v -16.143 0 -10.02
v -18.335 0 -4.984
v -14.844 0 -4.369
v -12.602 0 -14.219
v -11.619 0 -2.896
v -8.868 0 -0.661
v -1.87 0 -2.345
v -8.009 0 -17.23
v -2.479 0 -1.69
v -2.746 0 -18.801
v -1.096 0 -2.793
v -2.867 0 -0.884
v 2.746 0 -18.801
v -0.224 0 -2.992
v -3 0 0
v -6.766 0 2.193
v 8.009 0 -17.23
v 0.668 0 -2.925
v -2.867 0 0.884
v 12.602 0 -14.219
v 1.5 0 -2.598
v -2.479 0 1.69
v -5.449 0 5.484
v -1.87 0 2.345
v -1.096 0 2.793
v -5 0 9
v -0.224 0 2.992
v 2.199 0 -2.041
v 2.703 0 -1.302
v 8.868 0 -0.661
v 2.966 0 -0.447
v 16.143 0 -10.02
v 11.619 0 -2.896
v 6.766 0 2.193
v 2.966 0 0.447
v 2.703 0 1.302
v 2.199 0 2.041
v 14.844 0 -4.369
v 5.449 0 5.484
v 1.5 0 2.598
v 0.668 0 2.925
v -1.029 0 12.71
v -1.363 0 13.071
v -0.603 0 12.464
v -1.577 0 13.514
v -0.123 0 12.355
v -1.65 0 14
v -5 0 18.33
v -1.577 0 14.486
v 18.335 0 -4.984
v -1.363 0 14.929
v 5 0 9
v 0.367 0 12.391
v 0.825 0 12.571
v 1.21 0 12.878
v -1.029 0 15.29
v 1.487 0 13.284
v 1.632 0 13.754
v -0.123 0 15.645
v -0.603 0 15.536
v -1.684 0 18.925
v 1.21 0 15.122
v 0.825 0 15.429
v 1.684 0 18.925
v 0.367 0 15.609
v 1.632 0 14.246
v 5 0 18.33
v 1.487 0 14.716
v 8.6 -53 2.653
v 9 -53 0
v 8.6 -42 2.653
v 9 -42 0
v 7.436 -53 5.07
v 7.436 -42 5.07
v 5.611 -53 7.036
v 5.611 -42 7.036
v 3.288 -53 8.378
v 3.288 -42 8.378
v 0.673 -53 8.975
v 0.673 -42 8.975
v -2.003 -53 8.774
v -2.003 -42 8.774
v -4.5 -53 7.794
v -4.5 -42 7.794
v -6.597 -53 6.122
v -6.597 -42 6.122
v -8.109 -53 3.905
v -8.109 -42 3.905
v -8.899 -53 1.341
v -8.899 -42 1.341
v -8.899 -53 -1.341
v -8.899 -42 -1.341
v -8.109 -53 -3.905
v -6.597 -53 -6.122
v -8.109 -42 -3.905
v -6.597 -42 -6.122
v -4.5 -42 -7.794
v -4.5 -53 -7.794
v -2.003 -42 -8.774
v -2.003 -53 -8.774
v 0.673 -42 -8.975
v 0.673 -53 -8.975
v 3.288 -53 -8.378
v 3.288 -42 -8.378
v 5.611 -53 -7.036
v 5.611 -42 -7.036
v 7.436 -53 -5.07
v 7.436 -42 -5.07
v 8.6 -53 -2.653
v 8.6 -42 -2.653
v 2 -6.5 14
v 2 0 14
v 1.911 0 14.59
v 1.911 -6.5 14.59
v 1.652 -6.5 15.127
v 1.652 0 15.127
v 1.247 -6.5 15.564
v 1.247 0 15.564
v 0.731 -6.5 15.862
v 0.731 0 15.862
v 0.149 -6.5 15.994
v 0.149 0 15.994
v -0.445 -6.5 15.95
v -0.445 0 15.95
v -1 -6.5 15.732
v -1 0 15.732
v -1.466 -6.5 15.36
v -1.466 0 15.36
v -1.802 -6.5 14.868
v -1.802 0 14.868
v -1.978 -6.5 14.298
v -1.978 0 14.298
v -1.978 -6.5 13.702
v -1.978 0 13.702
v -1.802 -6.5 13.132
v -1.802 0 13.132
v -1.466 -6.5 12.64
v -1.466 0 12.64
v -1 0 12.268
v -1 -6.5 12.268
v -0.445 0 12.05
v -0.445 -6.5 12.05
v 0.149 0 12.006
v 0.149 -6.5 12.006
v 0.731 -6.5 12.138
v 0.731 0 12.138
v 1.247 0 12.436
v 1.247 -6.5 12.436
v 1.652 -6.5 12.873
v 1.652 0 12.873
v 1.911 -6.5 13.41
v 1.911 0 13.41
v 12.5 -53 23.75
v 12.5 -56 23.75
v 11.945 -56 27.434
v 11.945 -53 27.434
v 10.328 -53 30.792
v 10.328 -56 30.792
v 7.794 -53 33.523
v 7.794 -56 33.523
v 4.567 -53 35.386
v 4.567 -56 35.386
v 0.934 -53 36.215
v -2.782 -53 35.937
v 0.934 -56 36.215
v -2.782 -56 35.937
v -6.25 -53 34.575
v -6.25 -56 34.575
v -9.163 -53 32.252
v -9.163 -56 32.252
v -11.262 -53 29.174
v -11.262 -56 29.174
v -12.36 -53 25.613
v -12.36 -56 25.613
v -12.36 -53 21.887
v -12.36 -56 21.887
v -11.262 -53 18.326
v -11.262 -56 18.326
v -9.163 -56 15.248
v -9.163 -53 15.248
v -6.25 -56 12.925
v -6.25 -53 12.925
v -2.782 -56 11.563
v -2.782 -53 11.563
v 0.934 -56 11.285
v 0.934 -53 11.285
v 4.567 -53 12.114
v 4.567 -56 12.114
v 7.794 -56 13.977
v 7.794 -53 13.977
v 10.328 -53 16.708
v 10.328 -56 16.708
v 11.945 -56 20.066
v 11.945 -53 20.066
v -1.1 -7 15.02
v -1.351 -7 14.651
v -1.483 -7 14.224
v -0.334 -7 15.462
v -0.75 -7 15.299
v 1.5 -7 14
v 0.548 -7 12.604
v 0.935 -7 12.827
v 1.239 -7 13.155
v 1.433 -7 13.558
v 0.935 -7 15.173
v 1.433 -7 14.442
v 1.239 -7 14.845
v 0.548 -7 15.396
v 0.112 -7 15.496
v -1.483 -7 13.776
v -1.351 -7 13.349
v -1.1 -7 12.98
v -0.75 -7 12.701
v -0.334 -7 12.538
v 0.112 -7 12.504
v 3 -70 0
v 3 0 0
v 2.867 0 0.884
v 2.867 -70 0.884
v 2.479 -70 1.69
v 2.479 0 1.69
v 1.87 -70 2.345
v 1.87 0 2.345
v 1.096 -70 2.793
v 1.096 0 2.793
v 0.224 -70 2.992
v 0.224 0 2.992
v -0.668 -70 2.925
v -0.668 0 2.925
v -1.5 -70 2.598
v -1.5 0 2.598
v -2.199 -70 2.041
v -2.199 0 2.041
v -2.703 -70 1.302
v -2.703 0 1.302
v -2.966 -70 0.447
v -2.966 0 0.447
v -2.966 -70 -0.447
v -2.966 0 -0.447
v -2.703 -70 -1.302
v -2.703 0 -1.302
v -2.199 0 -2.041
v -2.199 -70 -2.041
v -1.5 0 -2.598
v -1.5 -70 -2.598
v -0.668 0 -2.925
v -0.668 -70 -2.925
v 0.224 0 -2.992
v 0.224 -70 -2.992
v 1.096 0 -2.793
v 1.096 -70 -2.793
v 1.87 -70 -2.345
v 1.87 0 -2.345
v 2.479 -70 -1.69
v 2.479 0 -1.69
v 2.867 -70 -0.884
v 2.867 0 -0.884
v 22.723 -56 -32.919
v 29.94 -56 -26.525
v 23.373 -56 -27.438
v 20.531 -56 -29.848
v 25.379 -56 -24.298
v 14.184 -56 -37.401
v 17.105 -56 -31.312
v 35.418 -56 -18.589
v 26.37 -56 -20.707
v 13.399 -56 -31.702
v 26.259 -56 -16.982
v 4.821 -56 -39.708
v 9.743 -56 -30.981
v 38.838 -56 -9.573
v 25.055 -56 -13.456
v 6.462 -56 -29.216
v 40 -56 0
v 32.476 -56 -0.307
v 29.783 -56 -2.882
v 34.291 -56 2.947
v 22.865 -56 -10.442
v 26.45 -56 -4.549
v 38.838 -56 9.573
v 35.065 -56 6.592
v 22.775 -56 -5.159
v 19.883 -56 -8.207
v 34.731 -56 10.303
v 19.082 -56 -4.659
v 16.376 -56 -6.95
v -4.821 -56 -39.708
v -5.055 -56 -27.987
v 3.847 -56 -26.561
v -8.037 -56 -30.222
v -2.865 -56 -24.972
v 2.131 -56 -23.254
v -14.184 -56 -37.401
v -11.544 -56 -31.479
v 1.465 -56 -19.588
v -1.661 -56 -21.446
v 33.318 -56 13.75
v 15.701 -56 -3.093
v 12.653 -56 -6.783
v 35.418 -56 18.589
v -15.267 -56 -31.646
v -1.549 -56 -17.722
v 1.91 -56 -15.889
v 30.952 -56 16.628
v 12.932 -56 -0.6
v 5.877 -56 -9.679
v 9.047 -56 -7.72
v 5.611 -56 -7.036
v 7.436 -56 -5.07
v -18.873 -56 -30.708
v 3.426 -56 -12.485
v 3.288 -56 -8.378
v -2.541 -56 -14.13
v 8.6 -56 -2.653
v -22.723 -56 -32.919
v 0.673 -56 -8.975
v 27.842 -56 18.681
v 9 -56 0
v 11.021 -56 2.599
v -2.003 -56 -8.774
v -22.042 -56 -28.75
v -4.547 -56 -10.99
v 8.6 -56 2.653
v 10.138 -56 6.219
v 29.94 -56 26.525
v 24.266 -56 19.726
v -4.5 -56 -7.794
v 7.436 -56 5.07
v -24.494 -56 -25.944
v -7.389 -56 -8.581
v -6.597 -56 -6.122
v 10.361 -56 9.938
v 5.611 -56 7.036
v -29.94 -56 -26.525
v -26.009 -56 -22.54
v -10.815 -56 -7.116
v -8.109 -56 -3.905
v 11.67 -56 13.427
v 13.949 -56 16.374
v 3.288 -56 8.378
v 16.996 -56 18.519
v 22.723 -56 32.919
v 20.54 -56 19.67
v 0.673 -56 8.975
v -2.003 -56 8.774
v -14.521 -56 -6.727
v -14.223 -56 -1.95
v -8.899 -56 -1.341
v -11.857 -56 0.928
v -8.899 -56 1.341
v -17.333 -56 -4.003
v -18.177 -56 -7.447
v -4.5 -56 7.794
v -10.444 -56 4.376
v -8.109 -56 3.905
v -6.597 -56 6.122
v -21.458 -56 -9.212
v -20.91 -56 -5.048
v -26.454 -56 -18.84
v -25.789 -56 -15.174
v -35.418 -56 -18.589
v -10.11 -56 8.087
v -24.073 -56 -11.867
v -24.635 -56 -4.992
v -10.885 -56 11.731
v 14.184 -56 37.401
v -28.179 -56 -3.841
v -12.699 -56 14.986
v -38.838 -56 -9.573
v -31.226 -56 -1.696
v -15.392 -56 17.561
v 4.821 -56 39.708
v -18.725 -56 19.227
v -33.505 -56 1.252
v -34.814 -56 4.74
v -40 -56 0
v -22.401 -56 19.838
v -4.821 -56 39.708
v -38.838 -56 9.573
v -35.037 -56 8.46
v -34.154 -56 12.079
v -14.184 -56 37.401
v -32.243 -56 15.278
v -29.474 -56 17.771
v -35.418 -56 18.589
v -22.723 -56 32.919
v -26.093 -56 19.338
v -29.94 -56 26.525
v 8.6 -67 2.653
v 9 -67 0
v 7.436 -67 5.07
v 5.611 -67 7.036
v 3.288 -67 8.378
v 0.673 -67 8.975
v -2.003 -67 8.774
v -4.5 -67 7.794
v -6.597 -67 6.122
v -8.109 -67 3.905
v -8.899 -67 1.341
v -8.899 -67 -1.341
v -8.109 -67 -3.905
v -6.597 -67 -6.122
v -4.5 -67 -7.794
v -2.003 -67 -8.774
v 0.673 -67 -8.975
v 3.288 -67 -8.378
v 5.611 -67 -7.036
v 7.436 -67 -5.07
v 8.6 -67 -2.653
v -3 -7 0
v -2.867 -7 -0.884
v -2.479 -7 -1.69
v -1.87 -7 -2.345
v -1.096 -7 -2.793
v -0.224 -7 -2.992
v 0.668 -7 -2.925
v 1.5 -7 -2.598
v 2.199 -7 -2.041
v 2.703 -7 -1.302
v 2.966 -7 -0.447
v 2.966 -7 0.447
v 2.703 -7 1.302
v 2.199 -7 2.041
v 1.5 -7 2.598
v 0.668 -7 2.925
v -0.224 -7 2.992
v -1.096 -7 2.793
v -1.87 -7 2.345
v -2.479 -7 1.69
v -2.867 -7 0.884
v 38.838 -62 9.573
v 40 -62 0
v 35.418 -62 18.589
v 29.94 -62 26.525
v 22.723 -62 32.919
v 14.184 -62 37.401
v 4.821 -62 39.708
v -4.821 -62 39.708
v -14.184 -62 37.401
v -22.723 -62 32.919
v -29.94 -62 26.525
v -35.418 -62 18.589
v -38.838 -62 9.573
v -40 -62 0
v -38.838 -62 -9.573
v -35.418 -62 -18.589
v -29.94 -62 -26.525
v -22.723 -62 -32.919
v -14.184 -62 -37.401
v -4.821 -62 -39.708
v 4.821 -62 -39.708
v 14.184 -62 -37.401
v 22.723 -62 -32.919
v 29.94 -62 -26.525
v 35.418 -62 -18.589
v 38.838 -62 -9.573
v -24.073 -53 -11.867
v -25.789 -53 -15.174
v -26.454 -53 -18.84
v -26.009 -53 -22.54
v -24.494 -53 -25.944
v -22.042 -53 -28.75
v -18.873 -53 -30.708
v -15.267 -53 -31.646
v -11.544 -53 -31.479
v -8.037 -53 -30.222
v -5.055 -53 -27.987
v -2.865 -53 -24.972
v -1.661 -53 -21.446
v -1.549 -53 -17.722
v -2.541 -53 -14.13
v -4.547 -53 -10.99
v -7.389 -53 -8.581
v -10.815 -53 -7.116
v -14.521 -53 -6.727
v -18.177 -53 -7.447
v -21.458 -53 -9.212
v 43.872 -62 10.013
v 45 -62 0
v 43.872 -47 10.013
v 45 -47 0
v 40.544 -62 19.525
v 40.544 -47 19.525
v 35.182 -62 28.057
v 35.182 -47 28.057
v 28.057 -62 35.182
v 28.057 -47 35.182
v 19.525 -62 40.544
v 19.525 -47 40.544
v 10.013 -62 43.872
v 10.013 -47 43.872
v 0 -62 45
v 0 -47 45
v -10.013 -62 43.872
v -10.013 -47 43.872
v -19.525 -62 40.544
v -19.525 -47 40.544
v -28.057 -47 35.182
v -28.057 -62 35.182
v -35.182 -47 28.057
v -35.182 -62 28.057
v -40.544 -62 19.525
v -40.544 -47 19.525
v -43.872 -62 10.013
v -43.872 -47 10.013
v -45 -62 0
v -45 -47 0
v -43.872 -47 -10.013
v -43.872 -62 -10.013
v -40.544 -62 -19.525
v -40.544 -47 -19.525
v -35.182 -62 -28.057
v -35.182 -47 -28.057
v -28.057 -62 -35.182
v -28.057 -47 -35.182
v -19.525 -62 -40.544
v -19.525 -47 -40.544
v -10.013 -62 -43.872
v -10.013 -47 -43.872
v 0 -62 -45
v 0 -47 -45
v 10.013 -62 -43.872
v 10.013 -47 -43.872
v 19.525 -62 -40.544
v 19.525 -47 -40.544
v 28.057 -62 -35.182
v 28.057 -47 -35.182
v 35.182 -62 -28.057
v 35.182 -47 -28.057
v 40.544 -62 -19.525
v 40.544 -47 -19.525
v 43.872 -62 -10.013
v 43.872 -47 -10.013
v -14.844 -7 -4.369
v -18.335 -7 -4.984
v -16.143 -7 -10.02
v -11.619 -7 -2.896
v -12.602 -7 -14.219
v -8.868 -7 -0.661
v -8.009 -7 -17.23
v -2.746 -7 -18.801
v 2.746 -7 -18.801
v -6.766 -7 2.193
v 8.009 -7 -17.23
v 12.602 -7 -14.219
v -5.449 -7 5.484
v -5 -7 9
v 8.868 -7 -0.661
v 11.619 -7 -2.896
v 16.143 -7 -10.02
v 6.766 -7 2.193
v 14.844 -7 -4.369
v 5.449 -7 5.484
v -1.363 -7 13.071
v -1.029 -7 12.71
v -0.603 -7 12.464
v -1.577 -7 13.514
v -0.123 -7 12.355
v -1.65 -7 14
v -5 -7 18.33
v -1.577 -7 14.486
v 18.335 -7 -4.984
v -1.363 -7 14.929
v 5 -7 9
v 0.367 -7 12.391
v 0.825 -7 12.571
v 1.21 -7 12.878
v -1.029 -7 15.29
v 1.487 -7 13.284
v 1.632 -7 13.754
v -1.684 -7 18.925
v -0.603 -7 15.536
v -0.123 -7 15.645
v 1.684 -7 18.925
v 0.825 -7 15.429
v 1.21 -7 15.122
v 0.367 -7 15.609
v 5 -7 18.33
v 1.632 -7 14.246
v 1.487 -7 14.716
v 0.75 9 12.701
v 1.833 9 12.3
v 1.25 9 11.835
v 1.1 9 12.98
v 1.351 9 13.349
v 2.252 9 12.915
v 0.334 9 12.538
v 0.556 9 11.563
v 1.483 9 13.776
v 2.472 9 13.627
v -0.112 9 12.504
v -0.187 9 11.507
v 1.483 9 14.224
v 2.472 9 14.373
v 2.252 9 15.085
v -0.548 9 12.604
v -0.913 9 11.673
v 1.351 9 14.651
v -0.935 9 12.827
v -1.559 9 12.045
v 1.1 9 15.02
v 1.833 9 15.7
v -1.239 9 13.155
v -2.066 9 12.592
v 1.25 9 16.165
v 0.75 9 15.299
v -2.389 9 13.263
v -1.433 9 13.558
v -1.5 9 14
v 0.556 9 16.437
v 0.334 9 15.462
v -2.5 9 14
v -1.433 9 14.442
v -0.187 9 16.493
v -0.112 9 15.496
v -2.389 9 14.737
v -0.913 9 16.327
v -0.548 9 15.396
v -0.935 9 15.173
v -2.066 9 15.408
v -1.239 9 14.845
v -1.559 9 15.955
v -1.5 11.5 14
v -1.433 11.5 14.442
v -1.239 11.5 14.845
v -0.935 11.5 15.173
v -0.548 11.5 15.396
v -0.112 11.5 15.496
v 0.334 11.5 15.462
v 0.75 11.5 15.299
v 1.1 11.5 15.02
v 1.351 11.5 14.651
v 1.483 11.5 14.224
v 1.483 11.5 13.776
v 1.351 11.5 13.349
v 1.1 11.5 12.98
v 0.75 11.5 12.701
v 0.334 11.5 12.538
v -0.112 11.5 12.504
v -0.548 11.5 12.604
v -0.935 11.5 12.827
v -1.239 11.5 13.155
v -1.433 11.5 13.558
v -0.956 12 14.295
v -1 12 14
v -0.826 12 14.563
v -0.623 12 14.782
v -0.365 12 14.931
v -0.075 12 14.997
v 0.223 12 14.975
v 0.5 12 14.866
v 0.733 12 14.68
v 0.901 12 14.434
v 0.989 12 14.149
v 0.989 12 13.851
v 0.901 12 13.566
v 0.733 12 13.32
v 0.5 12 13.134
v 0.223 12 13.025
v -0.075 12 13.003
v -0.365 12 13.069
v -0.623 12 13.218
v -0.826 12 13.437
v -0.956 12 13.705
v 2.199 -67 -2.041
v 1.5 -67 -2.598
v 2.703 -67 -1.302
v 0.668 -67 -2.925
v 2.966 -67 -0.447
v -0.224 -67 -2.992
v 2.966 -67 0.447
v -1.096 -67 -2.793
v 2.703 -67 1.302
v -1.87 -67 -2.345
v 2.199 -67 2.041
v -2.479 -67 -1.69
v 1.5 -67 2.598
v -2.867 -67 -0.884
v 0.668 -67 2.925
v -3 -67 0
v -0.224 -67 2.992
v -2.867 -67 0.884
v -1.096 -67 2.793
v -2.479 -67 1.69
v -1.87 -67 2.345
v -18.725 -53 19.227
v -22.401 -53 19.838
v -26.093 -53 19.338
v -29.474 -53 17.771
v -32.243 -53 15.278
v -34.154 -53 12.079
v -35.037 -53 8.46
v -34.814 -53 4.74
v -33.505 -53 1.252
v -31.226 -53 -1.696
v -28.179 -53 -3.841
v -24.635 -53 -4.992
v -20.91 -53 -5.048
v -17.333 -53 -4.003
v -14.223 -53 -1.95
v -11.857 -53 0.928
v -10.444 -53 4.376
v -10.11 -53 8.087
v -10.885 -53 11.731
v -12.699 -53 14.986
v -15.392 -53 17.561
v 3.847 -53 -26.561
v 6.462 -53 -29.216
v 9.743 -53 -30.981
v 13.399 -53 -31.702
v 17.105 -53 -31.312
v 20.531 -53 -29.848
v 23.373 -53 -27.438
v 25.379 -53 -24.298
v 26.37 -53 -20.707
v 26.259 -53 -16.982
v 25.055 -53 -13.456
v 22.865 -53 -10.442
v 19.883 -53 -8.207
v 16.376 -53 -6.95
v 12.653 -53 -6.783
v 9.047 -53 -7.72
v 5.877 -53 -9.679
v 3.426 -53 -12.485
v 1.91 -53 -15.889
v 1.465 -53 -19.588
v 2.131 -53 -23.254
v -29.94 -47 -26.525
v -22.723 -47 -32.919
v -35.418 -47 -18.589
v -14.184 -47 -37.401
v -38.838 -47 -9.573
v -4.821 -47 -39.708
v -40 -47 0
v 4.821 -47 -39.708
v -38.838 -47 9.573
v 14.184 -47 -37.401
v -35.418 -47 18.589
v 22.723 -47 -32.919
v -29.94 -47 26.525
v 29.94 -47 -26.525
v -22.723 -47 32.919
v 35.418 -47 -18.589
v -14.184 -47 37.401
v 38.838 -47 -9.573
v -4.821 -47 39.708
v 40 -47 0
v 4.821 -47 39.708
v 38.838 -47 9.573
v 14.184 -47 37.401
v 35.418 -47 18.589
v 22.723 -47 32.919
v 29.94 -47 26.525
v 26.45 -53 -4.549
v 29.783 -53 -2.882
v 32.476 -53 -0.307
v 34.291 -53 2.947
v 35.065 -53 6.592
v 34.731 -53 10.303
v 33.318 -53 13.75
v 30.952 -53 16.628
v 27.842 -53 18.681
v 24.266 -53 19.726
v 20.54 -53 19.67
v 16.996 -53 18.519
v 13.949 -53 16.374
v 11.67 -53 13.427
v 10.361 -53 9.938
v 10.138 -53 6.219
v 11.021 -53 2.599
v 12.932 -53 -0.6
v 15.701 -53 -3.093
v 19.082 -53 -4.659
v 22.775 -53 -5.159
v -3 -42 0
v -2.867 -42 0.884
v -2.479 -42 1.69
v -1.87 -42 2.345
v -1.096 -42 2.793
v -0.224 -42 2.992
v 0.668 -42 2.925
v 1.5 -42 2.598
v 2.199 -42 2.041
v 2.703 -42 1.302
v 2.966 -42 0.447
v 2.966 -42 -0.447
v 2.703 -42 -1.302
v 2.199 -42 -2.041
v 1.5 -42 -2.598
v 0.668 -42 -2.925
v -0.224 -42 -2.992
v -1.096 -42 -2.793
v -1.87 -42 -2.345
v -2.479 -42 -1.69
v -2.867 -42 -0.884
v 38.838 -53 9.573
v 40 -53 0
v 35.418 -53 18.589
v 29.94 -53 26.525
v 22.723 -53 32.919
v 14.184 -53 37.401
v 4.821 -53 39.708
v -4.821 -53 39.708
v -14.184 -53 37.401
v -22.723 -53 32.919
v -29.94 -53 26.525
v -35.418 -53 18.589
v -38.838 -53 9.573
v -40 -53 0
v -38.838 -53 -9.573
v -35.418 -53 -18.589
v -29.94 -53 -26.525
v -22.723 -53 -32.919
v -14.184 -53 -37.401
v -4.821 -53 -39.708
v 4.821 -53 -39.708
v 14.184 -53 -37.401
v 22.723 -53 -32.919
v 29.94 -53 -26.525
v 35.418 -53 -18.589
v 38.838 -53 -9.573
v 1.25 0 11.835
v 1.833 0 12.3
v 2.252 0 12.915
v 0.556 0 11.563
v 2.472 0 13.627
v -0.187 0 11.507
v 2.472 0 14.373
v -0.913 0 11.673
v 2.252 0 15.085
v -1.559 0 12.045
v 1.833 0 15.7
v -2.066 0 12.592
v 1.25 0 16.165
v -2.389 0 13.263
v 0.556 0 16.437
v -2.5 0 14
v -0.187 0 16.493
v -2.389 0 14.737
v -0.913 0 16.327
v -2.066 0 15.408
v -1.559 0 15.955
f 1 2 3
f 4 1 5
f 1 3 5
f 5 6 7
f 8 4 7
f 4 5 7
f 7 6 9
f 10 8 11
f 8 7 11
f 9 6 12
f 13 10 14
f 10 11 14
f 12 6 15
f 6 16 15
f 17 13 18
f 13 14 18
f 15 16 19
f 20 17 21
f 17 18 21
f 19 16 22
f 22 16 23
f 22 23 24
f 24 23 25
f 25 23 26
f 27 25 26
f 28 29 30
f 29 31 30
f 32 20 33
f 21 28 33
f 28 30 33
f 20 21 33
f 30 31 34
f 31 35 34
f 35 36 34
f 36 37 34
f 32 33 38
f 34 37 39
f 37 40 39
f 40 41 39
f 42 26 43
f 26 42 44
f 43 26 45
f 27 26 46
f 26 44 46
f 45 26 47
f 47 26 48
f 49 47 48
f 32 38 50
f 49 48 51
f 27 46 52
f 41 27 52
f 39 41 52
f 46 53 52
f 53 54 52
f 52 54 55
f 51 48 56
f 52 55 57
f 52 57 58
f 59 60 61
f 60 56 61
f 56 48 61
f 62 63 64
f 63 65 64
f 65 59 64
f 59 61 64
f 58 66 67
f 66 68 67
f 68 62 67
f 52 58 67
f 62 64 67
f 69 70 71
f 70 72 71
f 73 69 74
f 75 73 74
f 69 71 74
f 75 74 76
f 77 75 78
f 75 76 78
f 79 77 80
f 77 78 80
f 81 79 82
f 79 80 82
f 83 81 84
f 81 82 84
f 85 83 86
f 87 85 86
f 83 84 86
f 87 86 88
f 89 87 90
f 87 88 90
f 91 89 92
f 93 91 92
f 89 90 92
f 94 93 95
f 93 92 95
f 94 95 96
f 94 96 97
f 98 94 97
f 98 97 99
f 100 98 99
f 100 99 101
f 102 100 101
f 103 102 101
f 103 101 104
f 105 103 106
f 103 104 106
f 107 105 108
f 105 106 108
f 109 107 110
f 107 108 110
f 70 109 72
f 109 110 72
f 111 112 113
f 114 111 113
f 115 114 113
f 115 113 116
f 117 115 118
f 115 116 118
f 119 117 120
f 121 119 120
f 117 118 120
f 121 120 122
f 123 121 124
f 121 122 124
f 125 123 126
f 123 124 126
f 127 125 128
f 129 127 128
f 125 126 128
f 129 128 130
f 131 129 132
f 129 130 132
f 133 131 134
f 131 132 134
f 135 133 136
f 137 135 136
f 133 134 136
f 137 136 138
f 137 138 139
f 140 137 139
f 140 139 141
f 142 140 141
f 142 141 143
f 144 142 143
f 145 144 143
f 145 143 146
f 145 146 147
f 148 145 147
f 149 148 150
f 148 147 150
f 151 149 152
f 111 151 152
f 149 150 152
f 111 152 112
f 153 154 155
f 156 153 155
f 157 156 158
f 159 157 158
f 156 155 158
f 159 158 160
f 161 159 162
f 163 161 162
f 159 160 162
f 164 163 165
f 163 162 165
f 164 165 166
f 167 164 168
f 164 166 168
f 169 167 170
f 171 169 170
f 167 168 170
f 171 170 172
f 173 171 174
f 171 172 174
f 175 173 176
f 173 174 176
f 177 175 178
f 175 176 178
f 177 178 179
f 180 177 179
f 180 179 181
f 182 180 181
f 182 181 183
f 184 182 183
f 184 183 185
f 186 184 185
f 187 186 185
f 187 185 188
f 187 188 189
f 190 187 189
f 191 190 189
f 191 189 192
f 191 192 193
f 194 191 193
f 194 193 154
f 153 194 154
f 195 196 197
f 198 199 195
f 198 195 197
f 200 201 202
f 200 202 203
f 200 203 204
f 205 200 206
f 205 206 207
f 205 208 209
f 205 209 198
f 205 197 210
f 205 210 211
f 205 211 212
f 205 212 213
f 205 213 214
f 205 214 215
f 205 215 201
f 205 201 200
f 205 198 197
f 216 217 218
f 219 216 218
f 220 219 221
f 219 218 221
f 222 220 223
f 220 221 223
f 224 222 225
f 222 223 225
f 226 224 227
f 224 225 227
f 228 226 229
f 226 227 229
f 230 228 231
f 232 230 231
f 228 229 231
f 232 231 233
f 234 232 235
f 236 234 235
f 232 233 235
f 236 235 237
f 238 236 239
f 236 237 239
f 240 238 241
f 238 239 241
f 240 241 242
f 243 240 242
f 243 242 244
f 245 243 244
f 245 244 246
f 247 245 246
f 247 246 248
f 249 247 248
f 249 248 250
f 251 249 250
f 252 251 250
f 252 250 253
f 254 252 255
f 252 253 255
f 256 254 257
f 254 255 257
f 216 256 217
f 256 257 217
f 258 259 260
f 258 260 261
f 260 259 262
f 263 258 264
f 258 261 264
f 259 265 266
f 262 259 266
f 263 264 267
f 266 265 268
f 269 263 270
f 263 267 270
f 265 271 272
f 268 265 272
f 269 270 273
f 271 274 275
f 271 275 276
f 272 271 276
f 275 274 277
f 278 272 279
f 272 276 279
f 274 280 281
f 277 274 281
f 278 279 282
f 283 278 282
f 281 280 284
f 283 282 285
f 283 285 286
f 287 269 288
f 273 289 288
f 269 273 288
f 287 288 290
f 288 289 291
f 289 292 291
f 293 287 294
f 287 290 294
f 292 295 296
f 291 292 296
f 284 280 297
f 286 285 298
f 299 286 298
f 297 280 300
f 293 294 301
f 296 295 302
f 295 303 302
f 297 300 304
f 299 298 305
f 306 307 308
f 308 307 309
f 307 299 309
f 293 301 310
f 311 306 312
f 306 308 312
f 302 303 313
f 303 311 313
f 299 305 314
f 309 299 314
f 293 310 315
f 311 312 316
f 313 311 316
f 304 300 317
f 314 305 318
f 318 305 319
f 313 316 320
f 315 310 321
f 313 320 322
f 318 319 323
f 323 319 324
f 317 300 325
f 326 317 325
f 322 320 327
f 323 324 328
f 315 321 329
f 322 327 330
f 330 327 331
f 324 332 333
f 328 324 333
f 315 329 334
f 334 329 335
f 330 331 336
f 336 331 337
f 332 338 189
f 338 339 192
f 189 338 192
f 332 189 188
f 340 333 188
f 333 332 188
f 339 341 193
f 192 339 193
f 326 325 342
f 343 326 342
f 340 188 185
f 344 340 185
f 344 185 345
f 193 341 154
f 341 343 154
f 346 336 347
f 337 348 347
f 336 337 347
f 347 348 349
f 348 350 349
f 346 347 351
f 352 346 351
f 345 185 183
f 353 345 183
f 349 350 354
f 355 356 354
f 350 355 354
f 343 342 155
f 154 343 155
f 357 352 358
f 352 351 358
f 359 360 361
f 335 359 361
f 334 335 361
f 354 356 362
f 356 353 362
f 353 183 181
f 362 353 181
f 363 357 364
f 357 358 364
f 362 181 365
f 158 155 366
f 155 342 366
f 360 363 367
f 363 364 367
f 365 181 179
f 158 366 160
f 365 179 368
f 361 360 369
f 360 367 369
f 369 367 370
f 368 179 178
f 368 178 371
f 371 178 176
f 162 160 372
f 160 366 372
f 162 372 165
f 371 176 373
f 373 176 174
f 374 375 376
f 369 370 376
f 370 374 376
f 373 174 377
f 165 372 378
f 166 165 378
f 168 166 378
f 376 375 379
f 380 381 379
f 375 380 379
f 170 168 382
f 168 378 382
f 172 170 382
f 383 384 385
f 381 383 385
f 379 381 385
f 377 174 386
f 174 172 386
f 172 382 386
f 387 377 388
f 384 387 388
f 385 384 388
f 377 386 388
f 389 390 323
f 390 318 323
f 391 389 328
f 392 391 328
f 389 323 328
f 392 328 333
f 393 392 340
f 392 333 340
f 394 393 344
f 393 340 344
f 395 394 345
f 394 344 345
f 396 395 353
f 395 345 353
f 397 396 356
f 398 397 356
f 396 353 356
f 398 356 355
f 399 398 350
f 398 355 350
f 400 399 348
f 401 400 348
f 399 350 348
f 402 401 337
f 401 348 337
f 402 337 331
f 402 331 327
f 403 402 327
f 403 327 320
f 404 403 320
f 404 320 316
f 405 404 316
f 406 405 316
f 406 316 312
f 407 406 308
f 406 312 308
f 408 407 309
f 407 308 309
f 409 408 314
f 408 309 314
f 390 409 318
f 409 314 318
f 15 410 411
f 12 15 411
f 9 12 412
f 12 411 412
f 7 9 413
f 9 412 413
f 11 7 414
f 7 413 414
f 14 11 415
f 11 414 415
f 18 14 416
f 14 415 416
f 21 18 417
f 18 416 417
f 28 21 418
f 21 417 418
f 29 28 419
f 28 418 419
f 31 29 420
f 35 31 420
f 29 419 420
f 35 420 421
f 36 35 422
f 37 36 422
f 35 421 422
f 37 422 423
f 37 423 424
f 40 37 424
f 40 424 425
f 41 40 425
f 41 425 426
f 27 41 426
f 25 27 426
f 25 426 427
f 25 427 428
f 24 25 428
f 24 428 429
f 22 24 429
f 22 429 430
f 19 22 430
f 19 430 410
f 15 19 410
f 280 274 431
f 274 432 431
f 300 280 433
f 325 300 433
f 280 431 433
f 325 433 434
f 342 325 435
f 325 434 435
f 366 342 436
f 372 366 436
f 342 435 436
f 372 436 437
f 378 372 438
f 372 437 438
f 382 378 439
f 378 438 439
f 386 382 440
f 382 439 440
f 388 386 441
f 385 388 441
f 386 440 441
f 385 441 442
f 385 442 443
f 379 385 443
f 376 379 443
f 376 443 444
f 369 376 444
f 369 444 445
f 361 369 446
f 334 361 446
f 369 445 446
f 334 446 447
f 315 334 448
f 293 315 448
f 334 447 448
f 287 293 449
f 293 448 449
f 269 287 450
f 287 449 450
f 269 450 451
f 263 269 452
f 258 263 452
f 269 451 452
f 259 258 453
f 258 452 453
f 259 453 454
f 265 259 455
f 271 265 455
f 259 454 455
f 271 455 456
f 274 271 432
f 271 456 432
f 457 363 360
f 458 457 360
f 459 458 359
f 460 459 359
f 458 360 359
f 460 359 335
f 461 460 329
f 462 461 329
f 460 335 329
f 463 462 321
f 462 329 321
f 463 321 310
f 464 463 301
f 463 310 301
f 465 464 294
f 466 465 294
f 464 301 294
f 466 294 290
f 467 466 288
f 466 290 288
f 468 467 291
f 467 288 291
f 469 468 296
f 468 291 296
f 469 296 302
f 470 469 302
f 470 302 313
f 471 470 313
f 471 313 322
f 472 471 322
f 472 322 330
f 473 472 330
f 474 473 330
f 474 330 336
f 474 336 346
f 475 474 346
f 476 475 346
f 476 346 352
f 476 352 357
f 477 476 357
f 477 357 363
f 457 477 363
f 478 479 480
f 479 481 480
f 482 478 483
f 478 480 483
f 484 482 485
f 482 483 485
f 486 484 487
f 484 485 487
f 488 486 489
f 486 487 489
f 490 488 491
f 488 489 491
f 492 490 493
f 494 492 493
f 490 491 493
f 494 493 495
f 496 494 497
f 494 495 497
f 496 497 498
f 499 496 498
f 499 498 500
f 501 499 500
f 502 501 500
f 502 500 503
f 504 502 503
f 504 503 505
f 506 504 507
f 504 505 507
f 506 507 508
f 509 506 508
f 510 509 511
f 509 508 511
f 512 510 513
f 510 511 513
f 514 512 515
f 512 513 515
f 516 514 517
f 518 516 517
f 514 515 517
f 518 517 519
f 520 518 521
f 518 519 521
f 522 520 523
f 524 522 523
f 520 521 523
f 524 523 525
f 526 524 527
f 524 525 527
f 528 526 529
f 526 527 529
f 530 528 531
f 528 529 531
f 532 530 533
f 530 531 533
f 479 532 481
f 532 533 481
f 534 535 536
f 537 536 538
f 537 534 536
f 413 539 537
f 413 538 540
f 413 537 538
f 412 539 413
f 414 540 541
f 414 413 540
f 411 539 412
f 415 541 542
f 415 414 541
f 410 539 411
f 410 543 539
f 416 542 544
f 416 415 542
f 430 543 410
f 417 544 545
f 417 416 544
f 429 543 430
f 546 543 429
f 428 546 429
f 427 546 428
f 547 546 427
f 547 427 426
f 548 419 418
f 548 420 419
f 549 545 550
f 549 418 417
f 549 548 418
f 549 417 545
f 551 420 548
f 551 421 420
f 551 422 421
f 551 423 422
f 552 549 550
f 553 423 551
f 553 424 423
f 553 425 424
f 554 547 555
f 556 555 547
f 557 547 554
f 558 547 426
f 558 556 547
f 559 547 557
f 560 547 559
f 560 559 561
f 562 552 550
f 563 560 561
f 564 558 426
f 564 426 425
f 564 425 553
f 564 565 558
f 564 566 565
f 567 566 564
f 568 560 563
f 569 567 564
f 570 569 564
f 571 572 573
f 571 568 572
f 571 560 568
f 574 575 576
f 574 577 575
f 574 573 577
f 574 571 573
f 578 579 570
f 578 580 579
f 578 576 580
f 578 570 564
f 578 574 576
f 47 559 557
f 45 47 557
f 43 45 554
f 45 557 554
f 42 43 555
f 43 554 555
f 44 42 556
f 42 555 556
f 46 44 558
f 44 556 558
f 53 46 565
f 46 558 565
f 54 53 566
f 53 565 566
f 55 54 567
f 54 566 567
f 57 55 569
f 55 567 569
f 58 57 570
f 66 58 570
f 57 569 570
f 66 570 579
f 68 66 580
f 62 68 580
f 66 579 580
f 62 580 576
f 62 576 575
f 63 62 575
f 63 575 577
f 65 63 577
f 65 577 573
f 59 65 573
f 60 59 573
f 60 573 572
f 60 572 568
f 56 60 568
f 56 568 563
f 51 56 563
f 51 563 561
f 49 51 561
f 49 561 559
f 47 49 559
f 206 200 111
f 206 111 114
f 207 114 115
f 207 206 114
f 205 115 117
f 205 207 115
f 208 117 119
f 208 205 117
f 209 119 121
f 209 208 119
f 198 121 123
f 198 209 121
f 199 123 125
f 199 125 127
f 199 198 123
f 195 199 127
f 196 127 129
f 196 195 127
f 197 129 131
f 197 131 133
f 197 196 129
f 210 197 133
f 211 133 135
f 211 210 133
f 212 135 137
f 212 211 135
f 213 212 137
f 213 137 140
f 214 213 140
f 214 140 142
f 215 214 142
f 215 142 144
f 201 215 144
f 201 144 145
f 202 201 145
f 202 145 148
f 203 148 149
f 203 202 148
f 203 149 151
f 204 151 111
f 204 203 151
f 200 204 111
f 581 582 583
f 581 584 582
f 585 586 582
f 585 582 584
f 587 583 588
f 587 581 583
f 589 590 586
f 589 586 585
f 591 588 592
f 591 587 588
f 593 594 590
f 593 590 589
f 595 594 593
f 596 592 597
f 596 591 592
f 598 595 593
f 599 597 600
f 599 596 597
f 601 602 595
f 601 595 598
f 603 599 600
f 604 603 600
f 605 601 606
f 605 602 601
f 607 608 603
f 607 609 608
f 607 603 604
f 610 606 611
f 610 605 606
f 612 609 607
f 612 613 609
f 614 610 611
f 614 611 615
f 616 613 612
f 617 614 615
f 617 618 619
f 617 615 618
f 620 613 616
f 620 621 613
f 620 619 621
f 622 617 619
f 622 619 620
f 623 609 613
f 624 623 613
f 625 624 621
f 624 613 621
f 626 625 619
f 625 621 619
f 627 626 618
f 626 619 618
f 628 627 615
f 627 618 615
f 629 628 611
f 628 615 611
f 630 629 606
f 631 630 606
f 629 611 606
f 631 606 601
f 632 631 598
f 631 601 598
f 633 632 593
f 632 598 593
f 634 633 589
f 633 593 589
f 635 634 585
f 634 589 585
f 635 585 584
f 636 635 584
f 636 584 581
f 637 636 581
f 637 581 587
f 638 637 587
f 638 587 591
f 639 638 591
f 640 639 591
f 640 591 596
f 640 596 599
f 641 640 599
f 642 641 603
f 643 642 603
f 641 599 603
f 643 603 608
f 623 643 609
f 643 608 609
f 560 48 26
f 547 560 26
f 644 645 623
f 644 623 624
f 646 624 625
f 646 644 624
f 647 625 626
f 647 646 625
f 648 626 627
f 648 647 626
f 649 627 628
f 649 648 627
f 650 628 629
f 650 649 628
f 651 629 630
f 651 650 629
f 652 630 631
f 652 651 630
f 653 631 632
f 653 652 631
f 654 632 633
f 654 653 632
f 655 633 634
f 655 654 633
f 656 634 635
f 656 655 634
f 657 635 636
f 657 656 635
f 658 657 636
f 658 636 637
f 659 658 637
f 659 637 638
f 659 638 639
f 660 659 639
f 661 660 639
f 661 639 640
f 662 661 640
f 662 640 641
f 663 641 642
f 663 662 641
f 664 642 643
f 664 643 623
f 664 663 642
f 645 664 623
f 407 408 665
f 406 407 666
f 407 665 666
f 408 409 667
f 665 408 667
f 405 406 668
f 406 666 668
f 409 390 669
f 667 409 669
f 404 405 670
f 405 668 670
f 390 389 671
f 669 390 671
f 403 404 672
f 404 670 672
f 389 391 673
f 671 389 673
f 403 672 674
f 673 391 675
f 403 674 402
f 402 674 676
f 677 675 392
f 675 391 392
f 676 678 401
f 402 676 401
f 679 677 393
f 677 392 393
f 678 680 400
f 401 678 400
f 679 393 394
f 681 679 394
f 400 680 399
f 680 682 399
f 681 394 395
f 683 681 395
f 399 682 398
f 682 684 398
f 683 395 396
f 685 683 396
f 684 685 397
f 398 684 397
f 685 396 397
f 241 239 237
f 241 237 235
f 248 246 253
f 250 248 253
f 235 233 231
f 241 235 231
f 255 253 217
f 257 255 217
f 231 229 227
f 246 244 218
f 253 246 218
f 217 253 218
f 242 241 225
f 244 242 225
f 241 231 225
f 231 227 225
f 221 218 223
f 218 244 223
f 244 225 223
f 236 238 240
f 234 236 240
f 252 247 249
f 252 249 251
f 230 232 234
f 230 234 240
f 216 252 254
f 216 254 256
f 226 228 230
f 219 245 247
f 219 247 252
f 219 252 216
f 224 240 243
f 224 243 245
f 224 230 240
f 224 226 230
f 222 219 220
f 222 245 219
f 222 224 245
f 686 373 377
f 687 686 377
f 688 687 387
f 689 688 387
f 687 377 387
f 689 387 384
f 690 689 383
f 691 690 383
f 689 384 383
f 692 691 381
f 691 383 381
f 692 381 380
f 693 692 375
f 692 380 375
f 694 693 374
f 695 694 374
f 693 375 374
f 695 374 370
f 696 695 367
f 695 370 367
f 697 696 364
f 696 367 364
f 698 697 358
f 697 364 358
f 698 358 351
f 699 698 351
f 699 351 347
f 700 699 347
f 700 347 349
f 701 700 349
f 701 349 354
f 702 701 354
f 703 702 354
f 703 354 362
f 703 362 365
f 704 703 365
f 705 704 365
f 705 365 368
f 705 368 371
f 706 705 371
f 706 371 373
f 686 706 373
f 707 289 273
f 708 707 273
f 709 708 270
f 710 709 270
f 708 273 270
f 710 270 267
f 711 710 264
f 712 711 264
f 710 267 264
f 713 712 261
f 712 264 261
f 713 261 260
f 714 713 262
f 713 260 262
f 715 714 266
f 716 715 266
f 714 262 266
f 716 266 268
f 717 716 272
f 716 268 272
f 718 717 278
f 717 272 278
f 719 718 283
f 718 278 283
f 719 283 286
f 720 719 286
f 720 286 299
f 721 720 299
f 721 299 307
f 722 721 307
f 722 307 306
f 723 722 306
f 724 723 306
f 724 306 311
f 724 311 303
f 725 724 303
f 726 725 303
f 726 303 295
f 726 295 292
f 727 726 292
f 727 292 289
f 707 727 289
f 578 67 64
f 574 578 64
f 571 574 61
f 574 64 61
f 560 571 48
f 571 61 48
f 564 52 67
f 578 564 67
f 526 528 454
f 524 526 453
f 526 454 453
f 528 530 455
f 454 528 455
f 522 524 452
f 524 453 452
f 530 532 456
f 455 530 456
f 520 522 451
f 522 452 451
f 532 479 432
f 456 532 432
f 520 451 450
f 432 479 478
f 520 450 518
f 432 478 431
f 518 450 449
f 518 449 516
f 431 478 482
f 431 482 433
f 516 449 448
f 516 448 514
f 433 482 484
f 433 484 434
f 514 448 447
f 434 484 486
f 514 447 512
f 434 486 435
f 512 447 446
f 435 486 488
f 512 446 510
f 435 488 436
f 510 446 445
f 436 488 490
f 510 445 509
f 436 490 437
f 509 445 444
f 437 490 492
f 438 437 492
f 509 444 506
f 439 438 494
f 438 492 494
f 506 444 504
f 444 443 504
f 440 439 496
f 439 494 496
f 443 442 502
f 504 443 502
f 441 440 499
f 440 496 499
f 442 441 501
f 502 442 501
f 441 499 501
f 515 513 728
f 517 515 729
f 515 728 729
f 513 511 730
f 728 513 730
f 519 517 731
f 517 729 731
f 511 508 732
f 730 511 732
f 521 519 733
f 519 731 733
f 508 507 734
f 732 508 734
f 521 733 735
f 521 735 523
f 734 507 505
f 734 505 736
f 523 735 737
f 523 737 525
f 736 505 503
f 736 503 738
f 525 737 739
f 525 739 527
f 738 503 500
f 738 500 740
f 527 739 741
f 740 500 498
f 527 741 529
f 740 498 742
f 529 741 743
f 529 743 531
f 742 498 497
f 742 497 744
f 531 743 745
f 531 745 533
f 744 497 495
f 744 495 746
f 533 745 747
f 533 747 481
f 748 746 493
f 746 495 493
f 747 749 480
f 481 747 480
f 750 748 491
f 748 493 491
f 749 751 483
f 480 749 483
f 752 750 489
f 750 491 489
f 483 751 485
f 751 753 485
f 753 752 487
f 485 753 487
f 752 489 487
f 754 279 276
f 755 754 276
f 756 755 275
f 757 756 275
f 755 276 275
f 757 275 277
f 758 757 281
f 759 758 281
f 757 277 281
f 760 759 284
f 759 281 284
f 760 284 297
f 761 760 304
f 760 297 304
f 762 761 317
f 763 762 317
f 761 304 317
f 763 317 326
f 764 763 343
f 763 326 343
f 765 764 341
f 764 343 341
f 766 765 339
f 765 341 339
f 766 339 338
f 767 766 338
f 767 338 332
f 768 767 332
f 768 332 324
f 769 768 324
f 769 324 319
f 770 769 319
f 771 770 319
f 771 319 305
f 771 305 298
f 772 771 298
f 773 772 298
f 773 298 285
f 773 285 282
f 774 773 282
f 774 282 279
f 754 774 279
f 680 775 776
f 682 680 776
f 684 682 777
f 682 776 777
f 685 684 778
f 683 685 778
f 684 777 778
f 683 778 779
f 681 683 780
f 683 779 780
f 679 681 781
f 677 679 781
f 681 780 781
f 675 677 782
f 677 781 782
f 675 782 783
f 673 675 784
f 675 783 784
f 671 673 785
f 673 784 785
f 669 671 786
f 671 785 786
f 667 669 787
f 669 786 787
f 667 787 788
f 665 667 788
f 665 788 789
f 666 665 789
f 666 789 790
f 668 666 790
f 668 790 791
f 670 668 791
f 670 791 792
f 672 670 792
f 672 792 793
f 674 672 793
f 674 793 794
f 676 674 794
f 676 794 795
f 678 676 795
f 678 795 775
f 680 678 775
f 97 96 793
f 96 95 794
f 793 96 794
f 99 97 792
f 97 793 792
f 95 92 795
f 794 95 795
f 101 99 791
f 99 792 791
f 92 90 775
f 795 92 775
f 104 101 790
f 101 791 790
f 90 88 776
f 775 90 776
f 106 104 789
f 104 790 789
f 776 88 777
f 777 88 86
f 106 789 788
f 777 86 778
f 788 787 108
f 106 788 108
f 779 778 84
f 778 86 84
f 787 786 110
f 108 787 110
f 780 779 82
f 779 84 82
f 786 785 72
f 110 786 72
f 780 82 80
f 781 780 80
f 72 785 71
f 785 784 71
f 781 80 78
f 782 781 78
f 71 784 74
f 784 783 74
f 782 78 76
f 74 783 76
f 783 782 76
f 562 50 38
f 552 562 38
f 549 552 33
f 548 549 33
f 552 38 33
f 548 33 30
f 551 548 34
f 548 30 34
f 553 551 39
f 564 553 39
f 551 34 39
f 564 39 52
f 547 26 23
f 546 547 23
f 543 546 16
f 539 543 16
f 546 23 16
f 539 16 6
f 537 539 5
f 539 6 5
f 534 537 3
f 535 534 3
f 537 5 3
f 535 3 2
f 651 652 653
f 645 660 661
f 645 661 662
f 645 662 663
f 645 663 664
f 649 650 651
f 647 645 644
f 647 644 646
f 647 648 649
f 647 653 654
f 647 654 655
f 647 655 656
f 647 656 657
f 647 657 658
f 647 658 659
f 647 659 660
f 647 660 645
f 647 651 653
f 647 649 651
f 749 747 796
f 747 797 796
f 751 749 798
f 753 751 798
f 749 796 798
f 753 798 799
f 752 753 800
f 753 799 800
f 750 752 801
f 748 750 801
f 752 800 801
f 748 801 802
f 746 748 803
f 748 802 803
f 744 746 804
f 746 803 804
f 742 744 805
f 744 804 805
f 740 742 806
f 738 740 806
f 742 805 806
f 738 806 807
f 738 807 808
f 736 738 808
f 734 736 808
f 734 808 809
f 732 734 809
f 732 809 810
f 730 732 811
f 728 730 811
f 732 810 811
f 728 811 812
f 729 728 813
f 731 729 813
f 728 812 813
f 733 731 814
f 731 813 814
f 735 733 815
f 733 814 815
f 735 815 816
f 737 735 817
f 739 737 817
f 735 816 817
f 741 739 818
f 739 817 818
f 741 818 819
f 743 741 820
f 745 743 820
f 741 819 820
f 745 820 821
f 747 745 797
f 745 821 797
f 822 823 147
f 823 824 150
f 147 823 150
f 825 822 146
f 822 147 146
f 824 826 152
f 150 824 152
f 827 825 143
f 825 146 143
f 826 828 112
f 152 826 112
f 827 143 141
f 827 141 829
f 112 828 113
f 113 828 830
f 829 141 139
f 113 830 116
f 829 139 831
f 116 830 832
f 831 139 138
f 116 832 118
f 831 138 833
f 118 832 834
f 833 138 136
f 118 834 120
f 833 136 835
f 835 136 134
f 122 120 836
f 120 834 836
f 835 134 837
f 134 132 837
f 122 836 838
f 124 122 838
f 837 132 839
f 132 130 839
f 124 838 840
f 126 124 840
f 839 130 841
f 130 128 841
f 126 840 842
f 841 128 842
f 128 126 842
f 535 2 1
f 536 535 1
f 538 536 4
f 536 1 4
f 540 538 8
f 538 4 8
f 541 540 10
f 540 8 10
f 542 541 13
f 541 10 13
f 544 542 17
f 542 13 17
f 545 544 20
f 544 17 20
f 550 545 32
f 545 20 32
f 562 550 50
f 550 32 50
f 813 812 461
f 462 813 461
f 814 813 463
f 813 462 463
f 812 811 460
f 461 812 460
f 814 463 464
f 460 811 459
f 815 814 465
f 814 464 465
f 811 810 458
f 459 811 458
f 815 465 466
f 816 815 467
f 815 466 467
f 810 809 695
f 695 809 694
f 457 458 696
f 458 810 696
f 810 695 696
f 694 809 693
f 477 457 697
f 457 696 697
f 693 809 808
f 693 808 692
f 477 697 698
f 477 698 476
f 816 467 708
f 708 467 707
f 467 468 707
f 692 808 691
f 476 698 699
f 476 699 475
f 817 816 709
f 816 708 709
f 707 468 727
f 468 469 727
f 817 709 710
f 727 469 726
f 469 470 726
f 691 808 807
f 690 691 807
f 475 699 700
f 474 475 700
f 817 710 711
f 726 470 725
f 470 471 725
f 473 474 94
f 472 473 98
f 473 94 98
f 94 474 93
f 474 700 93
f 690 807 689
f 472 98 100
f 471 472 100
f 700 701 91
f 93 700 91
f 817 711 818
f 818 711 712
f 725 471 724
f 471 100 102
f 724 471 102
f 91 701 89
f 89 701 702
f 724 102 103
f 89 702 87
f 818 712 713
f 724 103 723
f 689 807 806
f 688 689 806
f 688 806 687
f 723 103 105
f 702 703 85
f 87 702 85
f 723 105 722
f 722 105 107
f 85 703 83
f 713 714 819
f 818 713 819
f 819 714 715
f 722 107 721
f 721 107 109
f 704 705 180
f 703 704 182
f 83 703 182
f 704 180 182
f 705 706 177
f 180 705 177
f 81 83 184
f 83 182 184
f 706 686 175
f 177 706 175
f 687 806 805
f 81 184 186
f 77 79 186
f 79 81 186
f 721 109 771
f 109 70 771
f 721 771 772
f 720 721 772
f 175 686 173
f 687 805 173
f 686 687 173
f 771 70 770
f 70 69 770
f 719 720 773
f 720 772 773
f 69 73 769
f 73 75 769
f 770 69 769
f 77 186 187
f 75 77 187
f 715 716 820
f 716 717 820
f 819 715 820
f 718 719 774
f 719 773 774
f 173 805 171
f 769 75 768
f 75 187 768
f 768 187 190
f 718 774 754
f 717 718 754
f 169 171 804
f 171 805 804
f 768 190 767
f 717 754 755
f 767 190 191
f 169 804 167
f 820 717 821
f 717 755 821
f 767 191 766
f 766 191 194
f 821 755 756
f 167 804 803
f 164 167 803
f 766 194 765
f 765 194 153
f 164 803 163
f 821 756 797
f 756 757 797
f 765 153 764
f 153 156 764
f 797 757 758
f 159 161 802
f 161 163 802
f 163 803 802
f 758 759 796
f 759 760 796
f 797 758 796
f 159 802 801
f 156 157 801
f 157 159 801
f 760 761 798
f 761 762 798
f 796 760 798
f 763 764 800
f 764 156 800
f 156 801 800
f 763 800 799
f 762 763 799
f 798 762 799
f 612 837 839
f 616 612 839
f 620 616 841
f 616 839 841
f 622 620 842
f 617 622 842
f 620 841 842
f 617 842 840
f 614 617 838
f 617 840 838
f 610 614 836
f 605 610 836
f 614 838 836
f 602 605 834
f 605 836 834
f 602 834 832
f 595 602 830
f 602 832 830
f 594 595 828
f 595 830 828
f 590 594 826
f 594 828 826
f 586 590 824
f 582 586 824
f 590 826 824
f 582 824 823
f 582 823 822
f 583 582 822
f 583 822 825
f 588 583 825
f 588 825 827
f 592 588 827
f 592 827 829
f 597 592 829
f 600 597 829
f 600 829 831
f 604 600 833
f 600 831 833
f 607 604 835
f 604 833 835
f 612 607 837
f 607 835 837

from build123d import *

# Parameters (mm, degrees)
F1_DEPTH         = 7
F2_D             = 6
F3_D             = 3.3
F4_R             = 2.5
F5_DEPTH         = 9
F6_R             = 2
F7_DEPTH         = 7
F8_R             = 1.5
F9_DEPTH         = 3
F10_SIZE         = 0.5
F11_R            = 3
F12_DEPTH        = 70
F16_D            = 6
F17_R            = 12.5
F18_DEPTH        = 68.001
F18_COPIES_COUNT = 5


# Not quite as in the source:
# - a pattern or mirror of a feature is missing from the dataset's text; its kind, count and spacing are read off the source's solid


with BuildPart() as f1:
    # F0 (on Front) → F1 (new body)
    with BuildSketch(Plane.XZ):
        with BuildLine():
            Line((5, 9), (5, 18.3303027798))
            ThreePointArc((5, 18.3303027798), (0, 19), (-5, 18.3303027798))
            Line((-5, 18.3303027798), (-5, 9))
            ThreePointArc((-5, 9), (-8.8679852531, -0.6613807072), (-18.3346110241, -4.9841788286))
            ThreePointArc((-18.3346110241, -4.9841788286), (0, -19), (18.3346110241, -4.9841788286))
            ThreePointArc((18.3346110241, -4.9841788286), (8.8679852531, -0.6613807072), (5, 9))
        make_face()
    extrude(amount=F1_DEPTH)

    # F2 (through all)
    with Locations(Plane(origin=(0, 0, 0), x_dir=(1, 0, 0), z_dir=(0, 1, 0))):
        with Locations((0, 0)):
            Hole(F2_D / 2)

    # F3 (through all)
    with Locations(Plane(origin=(0, 0, 0), x_dir=(1, 0, 0), z_dir=(0, 1, 0))):
        with Locations((0, -14)):
            Hole(F3_D / 2)


with BuildPart() as f5:
    # F4 (on face) → F5 (new body)
    with BuildSketch(Plane(origin=(0, 0, 0), x_dir=(-1, 0, 0), z_dir=(0, 1, 0))):
        with Locations((0, 14)):
            Circle(F4_R)
    extrude(amount=F5_DEPTH)

    # F6 (on face) → F7 (join)
    with BuildSketch(Plane.XZ):
        with Locations((0, 14)):
            Circle(F6_R)
    extrude(amount=F7_DEPTH)

    # F8 (on face) → F9 (join)
    with BuildSketch(Plane(origin=(0, 9, 0), x_dir=(-1, 0, 0), z_dir=(0, 1, 0))):
        with Locations((0, 14)):
            Circle(F8_R)
    extrude(amount=F9_DEPTH)

    # F10
    f10_edges = [f5.edges().sort_by_distance(p)[0] for p in [
        (1.5, 12, 14),
        (-2, -7, 14),
    ]]
    chamfer(f10_edges, length=F10_SIZE)


with BuildPart() as f12:
    # F11 (on Front) → F12 (new body)
    with BuildSketch(Plane.XZ):
        Circle(F11_R)
    extrude(amount=F12_DEPTH)


with BuildPart() as f14:
    # F13 (on Top) → F14 (revolve)
    with BuildSketch(Plane.XY):
        Polygon((0, -42), (0, -67), (9, -67), (9, -56), (40, -56), (40, -62), (45, -62), (45, -47), (40, -47), (40, -53), (9, -53), (9, -42), align=None)
    revolve(axis=Axis((0, -63.0867569871, 0), (0, -1, 0)))

    # F16 (through all)
    with Locations(Plane.XZ.offset(67)):
        with Locations((0, 0)):
            Hole(F16_D / 2)

    # F17 (on face) → F18 (cut, through all)
    with BuildSketch(Plane.XZ.offset(56)):
        with Locations((0, 23.75)):
            Circle(F17_R)
    f18 = extrude(amount=-F18_DEPTH, mode=Mode.SUBTRACT)

    # F18_copies: F18 ×5 about axis
    f18_copies_axis = Axis((0, 0, 0), (0, 1, 0))
    for i in range(1, F18_COPIES_COUNT):
        add(f18.rotate(f18_copies_axis, i * 360 / F18_COPIES_COUNT), mode=Mode.SUBTRACT)


solid = Compound([f1.part, f5.part, f12.part, f14.part])
